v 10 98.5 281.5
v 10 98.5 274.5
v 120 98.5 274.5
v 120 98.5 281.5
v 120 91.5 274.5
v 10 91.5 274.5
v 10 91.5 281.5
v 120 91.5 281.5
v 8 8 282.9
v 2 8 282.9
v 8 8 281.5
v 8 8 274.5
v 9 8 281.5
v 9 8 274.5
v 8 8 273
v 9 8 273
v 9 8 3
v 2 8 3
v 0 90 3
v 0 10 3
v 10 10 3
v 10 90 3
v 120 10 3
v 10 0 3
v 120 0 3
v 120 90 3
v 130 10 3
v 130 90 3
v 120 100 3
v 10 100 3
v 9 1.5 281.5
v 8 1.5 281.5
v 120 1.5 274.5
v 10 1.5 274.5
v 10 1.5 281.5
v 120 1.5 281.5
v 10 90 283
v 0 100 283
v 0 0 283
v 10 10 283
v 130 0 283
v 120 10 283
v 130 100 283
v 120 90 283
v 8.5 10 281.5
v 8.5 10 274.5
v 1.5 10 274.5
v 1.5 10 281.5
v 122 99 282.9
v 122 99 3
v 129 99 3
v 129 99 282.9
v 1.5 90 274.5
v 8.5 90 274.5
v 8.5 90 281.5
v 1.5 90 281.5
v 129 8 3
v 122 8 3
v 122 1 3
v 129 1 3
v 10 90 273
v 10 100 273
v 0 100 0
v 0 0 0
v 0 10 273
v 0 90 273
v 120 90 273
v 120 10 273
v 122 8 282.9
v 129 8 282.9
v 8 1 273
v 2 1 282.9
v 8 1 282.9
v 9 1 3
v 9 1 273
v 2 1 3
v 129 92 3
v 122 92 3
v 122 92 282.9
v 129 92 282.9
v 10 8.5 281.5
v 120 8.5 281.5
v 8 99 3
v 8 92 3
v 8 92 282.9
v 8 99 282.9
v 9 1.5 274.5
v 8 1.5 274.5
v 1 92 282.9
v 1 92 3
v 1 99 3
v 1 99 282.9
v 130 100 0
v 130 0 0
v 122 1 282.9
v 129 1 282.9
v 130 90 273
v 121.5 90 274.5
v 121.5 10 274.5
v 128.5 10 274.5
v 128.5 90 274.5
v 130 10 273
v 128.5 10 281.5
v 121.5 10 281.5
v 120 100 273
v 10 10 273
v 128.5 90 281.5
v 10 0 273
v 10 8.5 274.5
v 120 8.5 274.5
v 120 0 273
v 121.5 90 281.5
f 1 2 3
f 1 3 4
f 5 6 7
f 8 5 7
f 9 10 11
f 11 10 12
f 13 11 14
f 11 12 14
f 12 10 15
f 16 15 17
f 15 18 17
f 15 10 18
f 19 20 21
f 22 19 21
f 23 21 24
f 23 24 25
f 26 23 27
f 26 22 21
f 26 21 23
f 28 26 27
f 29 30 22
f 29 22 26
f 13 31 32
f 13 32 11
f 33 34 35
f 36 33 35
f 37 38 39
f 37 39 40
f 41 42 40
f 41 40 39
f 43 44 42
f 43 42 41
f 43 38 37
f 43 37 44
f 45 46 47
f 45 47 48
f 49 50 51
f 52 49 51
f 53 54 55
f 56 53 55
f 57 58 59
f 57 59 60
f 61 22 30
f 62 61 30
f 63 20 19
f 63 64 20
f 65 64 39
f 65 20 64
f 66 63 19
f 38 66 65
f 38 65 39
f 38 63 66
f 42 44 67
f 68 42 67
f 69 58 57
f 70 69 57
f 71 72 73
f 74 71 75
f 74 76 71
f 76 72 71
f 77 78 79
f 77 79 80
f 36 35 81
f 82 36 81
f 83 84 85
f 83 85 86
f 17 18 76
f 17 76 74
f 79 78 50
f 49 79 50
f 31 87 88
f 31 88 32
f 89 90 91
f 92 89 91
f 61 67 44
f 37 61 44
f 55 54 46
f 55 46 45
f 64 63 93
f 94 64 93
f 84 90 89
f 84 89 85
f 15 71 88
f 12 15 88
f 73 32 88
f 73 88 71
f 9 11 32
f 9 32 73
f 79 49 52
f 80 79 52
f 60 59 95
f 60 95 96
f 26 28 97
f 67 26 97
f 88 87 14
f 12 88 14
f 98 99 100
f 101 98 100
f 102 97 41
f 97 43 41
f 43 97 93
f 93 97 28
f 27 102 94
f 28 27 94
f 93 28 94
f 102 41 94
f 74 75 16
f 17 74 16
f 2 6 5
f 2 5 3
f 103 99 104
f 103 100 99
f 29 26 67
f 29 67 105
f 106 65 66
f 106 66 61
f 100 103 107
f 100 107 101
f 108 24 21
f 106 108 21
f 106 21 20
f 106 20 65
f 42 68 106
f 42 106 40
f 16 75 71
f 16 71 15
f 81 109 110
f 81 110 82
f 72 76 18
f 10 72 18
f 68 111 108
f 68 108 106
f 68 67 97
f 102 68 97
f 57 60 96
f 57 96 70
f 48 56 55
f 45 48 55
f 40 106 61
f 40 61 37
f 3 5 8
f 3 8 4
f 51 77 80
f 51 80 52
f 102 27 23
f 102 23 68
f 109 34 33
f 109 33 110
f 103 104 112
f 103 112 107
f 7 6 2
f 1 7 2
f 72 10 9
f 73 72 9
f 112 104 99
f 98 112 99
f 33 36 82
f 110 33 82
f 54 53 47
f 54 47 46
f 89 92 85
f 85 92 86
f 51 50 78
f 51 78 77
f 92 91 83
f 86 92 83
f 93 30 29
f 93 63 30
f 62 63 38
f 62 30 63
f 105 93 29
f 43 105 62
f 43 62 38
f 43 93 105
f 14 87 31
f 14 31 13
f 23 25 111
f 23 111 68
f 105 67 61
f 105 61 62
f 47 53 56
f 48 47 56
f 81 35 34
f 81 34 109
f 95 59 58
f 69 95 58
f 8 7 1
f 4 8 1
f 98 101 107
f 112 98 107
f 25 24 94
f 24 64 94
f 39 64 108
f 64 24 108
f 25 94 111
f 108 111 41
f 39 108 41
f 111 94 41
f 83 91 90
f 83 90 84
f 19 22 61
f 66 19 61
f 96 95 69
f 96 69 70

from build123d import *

# Parameters (mm, degrees)
SKETCH1_W           = 130
SKETCH1_H           = 100
BOSS_EXTRUDE1_DEPTH = 3
SKETCH2_W           = 10
SKETCH2_H           = 10
SKETCH2_W_2         = 7
SKETCH2_H_2         = 7
BOSS_EXTRUDE2_DEPTH = 280
SKETCH3_W           = 10
SKETCH3_H           = 10
SKETCH3_W_2         = 7
SKETCH3_H_2         = 7
BOSS_EXTRUDE3_DEPTH = 112
SKETCH4_W           = 10
SKETCH4_H           = 10
SKETCH4_W_2         = 7
SKETCH4_H_2         = 7
BOSS_EXTRUDE4_DEPTH = 112
SKETCH5_W           = 10
SKETCH5_H           = 10
SKETCH5_W_2         = 7
SKETCH5_H_2         = 7
BOSS_EXTRUDE5_DEPTH = 82
SKETCH6_W           = 10
SKETCH6_H           = 10
SKETCH6_W_2         = 7
SKETCH6_H_2         = 7
BOSS_EXTRUDE6_DEPTH = 82
SKETCH7_W           = 7
SKETCH7_H           = 7
SKETCH7_W_2         = 6
BOSS_EXTRUDE7_DEPTH = 0.1


with BuildPart() as part:
    # Sketch1 → Boss-Extrude1 (new body)
    with BuildSketch(Plane.XY):
        with Locations((65, 50)):
            Rectangle(SKETCH1_W, SKETCH1_H)
    extrude(amount=BOSS_EXTRUDE1_DEPTH)

    # Sketch2 → Boss-Extrude2 (add)
    # profile 1 of 4: a face of its own
    with BuildSketch(Plane.XY.offset(3)):
        with Locations((125, 95)):
            Rectangle(SKETCH2_W, SKETCH2_H)
        with Locations((125.5, 95.5)):
            Rectangle(SKETCH2_W_2, SKETCH2_H_2, mode=Mode.SUBTRACT)
    # profile 2 of 4: a face of its own
    with BuildSketch(Plane.XY.offset(3)):
        with Locations((125, 5)):
            Rectangle(SKETCH2_W, SKETCH2_H)
        with Locations((125.5, 4.5)):
            Rectangle(SKETCH2_W_2, SKETCH2_H_2, mode=Mode.SUBTRACT)
    # profile 3 of 4: a face of its own
    with BuildSketch(Plane.XY.offset(3)):
        with Locations((5, 5)):
            Rectangle(SKETCH2_W, SKETCH2_H)
        with Locations((5.5, 4.5)):
            Rectangle(SKETCH2_W_2, SKETCH2_H_2, mode=Mode.SUBTRACT)
    # profile 4 of 4: a face of its own
    with BuildSketch(Plane.XY.offset(3)):
        with Locations((5, 95)):
            Rectangle(SKETCH2_W, SKETCH2_H)
        with Locations((4.5, 95.5)):
            Rectangle(SKETCH2_W_2, SKETCH2_H_2, mode=Mode.SUBTRACT)
    extrude(amount=BOSS_EXTRUDE2_DEPTH)

    # Sketch3 → Boss-Extrude3 (add)
    with BuildSketch(Plane.ZY.offset(-120)):
        with Locations((278, 95)):
            Rectangle(SKETCH3_W, SKETCH3_H)
        with Locations((278, 95)):
            Rectangle(SKETCH3_W_2, SKETCH3_H_2, mode=Mode.SUBTRACT)
    extrude(amount=BOSS_EXTRUDE3_DEPTH)

    # Sketch4 → Boss-Extrude4 (add)
    with BuildSketch(Plane.ZY.offset(-120)):
        with Locations((278, 5)):
            Rectangle(SKETCH4_W, SKETCH4_H)
        with Locations((278, 5)):
            Rectangle(SKETCH4_W_2, SKETCH4_H_2, mode=Mode.SUBTRACT)
    extrude(amount=BOSS_EXTRUDE4_DEPTH)

    # Sketch5 → Boss-Extrude5 (add)
    with BuildSketch(Plane(origin=(0, 10, 0), x_dir=(1, 0, 0), z_dir=(0, 1, 0))):
        with Locations((125, -278)):
            Rectangle(SKETCH5_W, SKETCH5_H)
        with Locations((125, -278)):
            Rectangle(SKETCH5_W_2, SKETCH5_H_2, mode=Mode.SUBTRACT)
    extrude(amount=BOSS_EXTRUDE5_DEPTH)

    # Sketch6 → Boss-Extrude6 (add)
    with BuildSketch(Plane.XZ.offset(-90)):
        with Locations((5, 278)):
            Rectangle(SKETCH6_W, SKETCH6_H)
        with Locations((5, 278)):
            Rectangle(SKETCH6_W_2, SKETCH6_H_2, mode=Mode.SUBTRACT)
    extrude(amount=BOSS_EXTRUDE6_DEPTH)

    # Sketch7 → Boss-Extrude7 (add)
    with BuildSketch(Plane.XY.offset(283)):
        with Locations((4.5, 95.5)):
            Rectangle(SKETCH7_W, SKETCH7_H)
        with Locations((125.5, 95.5)):
            Rectangle(SKETCH7_W, SKETCH7_H)
        with Locations((125.5, 4.5)):
            Rectangle(SKETCH7_W, SKETCH7_H)
        with Locations((5, 4.5)):
            Rectangle(SKETCH7_W_2, SKETCH7_H)
    extrude(amount=-BOSS_EXTRUDE7_DEPTH)


solid = part.part
